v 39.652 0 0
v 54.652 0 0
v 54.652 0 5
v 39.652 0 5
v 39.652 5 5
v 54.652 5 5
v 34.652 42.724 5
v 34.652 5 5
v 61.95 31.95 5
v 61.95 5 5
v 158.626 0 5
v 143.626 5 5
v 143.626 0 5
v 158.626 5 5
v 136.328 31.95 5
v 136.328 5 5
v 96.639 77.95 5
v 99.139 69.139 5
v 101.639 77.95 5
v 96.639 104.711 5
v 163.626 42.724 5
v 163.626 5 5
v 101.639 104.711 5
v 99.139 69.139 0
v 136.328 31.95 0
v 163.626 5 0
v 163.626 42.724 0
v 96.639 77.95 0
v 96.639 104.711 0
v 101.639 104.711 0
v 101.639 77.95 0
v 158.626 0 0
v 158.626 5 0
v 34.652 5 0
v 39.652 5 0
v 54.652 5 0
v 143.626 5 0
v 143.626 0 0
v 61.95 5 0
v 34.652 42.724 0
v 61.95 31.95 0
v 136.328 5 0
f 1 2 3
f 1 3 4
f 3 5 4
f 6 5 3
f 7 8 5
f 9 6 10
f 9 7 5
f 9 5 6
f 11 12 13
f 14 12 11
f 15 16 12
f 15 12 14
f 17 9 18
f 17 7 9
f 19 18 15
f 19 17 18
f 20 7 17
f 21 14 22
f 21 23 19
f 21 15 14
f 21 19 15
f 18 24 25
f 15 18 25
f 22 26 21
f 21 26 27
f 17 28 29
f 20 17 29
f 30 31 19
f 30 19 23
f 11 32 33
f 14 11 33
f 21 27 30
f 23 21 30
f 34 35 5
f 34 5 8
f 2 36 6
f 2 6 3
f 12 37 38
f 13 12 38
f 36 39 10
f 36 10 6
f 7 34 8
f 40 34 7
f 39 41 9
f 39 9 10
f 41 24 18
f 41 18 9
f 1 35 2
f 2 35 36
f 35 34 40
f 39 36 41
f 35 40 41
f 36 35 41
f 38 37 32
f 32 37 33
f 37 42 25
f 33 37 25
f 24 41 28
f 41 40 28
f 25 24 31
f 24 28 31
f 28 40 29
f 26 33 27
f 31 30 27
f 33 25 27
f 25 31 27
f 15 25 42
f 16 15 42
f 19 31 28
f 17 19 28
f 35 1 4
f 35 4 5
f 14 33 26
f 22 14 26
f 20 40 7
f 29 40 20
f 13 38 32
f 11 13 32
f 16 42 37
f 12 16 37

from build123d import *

# Parameters (mm, degrees)
BOSS_EXTRUDE1_DEPTH = 5
CUT_EXTRUDE1_DEPTH  = 10
SKETCH3_W           = 102.016100564
SKETCH3_H           = 114.3636127
CUT_EXTRUDE2_DEPTH  = 10
SKETCH4_W           = 42.096187012
SKETCH4_H           = 80.761359859
CUT_EXTRUDE3_DEPTH  = 10
SKETCH5_W           = 5
SKETCH5_H           = 58.521368684
CUT_EXTRUDE4_DEPTH  = 10


with BuildPart() as part:
    # Sketch1 → Boss-Extrude1 (new body)
    with BuildSketch(Plane.XY):
        Polygon((34.65186026, 42.723894515), (99.138982873, 107.211017127), (200, 6.35), (185, 6.35), (185, 0), (170, 0), (170, 6.35), (165, 6.35), (100.675, 70.675), (61.950419081, 31.950419081), (61.950419081, 5), (54.65186026, 5), (54.65186026, 0), (39.65186026, 0), (39.65186026, 5), (34.65186026, 5), align=None)
    boss_extrude1 = extrude(amount=BOSS_EXTRUDE1_DEPTH)

    # Sketch2 → Cut-Extrude1 (cut)
    with BuildSketch(Plane.XY.offset(5)):
        Polygon((96.638982873, 104.711017127), (96.638982873, 80.711017127), (101.638982873, 80.711017127), (101.638982873, 104.711017127), (99.138982873, 107.211017127), align=None)
    extrude(amount=-CUT_EXTRUDE1_DEPTH, mode=Mode.SUBTRACT)

    # Sketch3 → Cut-Extrude2 (cut)
    with BuildSketch(Plane.XY.offset(5)):
        with Locations((150.147033155, 51.840357155)):
            Rectangle(SKETCH3_W, SKETCH3_H)
    extrude(amount=-CUT_EXTRUDE2_DEPTH, mode=Mode.SUBTRACT)

    # Mirror1: Boss-Extrude1 across plane
    add(boss_extrude1.mirror(Plane(origin=(99.138982873, 109.022163505, -5), x_dir=(0, 0, 1), z_dir=(-1, 0, 0))))

    # Sketch4 → Cut-Extrude3 (cut)
    with BuildSketch(Plane(origin=(0, 0, 0), x_dir=(-1, 0, 0), z_dir=(0, 0, -1))):
        with Locations((-13.603766754, 32.73650171)):
            Rectangle(SKETCH4_W, SKETCH4_H)
    extrude(amount=-CUT_EXTRUDE3_DEPTH, mode=Mode.SUBTRACT)

    # Sketch5 → Cut-Extrude4 (cut)
    with BuildSketch(Plane(origin=(0, 0, 0), x_dir=(-1, 0, 0), z_dir=(0, 0, -1))):
        with Locations((-99.138982873, 107.211017127)):
            Rectangle(SKETCH5_W, SKETCH5_H)
    extrude(amount=-CUT_EXTRUDE4_DEPTH, mode=Mode.SUBTRACT)


solid = part.part
